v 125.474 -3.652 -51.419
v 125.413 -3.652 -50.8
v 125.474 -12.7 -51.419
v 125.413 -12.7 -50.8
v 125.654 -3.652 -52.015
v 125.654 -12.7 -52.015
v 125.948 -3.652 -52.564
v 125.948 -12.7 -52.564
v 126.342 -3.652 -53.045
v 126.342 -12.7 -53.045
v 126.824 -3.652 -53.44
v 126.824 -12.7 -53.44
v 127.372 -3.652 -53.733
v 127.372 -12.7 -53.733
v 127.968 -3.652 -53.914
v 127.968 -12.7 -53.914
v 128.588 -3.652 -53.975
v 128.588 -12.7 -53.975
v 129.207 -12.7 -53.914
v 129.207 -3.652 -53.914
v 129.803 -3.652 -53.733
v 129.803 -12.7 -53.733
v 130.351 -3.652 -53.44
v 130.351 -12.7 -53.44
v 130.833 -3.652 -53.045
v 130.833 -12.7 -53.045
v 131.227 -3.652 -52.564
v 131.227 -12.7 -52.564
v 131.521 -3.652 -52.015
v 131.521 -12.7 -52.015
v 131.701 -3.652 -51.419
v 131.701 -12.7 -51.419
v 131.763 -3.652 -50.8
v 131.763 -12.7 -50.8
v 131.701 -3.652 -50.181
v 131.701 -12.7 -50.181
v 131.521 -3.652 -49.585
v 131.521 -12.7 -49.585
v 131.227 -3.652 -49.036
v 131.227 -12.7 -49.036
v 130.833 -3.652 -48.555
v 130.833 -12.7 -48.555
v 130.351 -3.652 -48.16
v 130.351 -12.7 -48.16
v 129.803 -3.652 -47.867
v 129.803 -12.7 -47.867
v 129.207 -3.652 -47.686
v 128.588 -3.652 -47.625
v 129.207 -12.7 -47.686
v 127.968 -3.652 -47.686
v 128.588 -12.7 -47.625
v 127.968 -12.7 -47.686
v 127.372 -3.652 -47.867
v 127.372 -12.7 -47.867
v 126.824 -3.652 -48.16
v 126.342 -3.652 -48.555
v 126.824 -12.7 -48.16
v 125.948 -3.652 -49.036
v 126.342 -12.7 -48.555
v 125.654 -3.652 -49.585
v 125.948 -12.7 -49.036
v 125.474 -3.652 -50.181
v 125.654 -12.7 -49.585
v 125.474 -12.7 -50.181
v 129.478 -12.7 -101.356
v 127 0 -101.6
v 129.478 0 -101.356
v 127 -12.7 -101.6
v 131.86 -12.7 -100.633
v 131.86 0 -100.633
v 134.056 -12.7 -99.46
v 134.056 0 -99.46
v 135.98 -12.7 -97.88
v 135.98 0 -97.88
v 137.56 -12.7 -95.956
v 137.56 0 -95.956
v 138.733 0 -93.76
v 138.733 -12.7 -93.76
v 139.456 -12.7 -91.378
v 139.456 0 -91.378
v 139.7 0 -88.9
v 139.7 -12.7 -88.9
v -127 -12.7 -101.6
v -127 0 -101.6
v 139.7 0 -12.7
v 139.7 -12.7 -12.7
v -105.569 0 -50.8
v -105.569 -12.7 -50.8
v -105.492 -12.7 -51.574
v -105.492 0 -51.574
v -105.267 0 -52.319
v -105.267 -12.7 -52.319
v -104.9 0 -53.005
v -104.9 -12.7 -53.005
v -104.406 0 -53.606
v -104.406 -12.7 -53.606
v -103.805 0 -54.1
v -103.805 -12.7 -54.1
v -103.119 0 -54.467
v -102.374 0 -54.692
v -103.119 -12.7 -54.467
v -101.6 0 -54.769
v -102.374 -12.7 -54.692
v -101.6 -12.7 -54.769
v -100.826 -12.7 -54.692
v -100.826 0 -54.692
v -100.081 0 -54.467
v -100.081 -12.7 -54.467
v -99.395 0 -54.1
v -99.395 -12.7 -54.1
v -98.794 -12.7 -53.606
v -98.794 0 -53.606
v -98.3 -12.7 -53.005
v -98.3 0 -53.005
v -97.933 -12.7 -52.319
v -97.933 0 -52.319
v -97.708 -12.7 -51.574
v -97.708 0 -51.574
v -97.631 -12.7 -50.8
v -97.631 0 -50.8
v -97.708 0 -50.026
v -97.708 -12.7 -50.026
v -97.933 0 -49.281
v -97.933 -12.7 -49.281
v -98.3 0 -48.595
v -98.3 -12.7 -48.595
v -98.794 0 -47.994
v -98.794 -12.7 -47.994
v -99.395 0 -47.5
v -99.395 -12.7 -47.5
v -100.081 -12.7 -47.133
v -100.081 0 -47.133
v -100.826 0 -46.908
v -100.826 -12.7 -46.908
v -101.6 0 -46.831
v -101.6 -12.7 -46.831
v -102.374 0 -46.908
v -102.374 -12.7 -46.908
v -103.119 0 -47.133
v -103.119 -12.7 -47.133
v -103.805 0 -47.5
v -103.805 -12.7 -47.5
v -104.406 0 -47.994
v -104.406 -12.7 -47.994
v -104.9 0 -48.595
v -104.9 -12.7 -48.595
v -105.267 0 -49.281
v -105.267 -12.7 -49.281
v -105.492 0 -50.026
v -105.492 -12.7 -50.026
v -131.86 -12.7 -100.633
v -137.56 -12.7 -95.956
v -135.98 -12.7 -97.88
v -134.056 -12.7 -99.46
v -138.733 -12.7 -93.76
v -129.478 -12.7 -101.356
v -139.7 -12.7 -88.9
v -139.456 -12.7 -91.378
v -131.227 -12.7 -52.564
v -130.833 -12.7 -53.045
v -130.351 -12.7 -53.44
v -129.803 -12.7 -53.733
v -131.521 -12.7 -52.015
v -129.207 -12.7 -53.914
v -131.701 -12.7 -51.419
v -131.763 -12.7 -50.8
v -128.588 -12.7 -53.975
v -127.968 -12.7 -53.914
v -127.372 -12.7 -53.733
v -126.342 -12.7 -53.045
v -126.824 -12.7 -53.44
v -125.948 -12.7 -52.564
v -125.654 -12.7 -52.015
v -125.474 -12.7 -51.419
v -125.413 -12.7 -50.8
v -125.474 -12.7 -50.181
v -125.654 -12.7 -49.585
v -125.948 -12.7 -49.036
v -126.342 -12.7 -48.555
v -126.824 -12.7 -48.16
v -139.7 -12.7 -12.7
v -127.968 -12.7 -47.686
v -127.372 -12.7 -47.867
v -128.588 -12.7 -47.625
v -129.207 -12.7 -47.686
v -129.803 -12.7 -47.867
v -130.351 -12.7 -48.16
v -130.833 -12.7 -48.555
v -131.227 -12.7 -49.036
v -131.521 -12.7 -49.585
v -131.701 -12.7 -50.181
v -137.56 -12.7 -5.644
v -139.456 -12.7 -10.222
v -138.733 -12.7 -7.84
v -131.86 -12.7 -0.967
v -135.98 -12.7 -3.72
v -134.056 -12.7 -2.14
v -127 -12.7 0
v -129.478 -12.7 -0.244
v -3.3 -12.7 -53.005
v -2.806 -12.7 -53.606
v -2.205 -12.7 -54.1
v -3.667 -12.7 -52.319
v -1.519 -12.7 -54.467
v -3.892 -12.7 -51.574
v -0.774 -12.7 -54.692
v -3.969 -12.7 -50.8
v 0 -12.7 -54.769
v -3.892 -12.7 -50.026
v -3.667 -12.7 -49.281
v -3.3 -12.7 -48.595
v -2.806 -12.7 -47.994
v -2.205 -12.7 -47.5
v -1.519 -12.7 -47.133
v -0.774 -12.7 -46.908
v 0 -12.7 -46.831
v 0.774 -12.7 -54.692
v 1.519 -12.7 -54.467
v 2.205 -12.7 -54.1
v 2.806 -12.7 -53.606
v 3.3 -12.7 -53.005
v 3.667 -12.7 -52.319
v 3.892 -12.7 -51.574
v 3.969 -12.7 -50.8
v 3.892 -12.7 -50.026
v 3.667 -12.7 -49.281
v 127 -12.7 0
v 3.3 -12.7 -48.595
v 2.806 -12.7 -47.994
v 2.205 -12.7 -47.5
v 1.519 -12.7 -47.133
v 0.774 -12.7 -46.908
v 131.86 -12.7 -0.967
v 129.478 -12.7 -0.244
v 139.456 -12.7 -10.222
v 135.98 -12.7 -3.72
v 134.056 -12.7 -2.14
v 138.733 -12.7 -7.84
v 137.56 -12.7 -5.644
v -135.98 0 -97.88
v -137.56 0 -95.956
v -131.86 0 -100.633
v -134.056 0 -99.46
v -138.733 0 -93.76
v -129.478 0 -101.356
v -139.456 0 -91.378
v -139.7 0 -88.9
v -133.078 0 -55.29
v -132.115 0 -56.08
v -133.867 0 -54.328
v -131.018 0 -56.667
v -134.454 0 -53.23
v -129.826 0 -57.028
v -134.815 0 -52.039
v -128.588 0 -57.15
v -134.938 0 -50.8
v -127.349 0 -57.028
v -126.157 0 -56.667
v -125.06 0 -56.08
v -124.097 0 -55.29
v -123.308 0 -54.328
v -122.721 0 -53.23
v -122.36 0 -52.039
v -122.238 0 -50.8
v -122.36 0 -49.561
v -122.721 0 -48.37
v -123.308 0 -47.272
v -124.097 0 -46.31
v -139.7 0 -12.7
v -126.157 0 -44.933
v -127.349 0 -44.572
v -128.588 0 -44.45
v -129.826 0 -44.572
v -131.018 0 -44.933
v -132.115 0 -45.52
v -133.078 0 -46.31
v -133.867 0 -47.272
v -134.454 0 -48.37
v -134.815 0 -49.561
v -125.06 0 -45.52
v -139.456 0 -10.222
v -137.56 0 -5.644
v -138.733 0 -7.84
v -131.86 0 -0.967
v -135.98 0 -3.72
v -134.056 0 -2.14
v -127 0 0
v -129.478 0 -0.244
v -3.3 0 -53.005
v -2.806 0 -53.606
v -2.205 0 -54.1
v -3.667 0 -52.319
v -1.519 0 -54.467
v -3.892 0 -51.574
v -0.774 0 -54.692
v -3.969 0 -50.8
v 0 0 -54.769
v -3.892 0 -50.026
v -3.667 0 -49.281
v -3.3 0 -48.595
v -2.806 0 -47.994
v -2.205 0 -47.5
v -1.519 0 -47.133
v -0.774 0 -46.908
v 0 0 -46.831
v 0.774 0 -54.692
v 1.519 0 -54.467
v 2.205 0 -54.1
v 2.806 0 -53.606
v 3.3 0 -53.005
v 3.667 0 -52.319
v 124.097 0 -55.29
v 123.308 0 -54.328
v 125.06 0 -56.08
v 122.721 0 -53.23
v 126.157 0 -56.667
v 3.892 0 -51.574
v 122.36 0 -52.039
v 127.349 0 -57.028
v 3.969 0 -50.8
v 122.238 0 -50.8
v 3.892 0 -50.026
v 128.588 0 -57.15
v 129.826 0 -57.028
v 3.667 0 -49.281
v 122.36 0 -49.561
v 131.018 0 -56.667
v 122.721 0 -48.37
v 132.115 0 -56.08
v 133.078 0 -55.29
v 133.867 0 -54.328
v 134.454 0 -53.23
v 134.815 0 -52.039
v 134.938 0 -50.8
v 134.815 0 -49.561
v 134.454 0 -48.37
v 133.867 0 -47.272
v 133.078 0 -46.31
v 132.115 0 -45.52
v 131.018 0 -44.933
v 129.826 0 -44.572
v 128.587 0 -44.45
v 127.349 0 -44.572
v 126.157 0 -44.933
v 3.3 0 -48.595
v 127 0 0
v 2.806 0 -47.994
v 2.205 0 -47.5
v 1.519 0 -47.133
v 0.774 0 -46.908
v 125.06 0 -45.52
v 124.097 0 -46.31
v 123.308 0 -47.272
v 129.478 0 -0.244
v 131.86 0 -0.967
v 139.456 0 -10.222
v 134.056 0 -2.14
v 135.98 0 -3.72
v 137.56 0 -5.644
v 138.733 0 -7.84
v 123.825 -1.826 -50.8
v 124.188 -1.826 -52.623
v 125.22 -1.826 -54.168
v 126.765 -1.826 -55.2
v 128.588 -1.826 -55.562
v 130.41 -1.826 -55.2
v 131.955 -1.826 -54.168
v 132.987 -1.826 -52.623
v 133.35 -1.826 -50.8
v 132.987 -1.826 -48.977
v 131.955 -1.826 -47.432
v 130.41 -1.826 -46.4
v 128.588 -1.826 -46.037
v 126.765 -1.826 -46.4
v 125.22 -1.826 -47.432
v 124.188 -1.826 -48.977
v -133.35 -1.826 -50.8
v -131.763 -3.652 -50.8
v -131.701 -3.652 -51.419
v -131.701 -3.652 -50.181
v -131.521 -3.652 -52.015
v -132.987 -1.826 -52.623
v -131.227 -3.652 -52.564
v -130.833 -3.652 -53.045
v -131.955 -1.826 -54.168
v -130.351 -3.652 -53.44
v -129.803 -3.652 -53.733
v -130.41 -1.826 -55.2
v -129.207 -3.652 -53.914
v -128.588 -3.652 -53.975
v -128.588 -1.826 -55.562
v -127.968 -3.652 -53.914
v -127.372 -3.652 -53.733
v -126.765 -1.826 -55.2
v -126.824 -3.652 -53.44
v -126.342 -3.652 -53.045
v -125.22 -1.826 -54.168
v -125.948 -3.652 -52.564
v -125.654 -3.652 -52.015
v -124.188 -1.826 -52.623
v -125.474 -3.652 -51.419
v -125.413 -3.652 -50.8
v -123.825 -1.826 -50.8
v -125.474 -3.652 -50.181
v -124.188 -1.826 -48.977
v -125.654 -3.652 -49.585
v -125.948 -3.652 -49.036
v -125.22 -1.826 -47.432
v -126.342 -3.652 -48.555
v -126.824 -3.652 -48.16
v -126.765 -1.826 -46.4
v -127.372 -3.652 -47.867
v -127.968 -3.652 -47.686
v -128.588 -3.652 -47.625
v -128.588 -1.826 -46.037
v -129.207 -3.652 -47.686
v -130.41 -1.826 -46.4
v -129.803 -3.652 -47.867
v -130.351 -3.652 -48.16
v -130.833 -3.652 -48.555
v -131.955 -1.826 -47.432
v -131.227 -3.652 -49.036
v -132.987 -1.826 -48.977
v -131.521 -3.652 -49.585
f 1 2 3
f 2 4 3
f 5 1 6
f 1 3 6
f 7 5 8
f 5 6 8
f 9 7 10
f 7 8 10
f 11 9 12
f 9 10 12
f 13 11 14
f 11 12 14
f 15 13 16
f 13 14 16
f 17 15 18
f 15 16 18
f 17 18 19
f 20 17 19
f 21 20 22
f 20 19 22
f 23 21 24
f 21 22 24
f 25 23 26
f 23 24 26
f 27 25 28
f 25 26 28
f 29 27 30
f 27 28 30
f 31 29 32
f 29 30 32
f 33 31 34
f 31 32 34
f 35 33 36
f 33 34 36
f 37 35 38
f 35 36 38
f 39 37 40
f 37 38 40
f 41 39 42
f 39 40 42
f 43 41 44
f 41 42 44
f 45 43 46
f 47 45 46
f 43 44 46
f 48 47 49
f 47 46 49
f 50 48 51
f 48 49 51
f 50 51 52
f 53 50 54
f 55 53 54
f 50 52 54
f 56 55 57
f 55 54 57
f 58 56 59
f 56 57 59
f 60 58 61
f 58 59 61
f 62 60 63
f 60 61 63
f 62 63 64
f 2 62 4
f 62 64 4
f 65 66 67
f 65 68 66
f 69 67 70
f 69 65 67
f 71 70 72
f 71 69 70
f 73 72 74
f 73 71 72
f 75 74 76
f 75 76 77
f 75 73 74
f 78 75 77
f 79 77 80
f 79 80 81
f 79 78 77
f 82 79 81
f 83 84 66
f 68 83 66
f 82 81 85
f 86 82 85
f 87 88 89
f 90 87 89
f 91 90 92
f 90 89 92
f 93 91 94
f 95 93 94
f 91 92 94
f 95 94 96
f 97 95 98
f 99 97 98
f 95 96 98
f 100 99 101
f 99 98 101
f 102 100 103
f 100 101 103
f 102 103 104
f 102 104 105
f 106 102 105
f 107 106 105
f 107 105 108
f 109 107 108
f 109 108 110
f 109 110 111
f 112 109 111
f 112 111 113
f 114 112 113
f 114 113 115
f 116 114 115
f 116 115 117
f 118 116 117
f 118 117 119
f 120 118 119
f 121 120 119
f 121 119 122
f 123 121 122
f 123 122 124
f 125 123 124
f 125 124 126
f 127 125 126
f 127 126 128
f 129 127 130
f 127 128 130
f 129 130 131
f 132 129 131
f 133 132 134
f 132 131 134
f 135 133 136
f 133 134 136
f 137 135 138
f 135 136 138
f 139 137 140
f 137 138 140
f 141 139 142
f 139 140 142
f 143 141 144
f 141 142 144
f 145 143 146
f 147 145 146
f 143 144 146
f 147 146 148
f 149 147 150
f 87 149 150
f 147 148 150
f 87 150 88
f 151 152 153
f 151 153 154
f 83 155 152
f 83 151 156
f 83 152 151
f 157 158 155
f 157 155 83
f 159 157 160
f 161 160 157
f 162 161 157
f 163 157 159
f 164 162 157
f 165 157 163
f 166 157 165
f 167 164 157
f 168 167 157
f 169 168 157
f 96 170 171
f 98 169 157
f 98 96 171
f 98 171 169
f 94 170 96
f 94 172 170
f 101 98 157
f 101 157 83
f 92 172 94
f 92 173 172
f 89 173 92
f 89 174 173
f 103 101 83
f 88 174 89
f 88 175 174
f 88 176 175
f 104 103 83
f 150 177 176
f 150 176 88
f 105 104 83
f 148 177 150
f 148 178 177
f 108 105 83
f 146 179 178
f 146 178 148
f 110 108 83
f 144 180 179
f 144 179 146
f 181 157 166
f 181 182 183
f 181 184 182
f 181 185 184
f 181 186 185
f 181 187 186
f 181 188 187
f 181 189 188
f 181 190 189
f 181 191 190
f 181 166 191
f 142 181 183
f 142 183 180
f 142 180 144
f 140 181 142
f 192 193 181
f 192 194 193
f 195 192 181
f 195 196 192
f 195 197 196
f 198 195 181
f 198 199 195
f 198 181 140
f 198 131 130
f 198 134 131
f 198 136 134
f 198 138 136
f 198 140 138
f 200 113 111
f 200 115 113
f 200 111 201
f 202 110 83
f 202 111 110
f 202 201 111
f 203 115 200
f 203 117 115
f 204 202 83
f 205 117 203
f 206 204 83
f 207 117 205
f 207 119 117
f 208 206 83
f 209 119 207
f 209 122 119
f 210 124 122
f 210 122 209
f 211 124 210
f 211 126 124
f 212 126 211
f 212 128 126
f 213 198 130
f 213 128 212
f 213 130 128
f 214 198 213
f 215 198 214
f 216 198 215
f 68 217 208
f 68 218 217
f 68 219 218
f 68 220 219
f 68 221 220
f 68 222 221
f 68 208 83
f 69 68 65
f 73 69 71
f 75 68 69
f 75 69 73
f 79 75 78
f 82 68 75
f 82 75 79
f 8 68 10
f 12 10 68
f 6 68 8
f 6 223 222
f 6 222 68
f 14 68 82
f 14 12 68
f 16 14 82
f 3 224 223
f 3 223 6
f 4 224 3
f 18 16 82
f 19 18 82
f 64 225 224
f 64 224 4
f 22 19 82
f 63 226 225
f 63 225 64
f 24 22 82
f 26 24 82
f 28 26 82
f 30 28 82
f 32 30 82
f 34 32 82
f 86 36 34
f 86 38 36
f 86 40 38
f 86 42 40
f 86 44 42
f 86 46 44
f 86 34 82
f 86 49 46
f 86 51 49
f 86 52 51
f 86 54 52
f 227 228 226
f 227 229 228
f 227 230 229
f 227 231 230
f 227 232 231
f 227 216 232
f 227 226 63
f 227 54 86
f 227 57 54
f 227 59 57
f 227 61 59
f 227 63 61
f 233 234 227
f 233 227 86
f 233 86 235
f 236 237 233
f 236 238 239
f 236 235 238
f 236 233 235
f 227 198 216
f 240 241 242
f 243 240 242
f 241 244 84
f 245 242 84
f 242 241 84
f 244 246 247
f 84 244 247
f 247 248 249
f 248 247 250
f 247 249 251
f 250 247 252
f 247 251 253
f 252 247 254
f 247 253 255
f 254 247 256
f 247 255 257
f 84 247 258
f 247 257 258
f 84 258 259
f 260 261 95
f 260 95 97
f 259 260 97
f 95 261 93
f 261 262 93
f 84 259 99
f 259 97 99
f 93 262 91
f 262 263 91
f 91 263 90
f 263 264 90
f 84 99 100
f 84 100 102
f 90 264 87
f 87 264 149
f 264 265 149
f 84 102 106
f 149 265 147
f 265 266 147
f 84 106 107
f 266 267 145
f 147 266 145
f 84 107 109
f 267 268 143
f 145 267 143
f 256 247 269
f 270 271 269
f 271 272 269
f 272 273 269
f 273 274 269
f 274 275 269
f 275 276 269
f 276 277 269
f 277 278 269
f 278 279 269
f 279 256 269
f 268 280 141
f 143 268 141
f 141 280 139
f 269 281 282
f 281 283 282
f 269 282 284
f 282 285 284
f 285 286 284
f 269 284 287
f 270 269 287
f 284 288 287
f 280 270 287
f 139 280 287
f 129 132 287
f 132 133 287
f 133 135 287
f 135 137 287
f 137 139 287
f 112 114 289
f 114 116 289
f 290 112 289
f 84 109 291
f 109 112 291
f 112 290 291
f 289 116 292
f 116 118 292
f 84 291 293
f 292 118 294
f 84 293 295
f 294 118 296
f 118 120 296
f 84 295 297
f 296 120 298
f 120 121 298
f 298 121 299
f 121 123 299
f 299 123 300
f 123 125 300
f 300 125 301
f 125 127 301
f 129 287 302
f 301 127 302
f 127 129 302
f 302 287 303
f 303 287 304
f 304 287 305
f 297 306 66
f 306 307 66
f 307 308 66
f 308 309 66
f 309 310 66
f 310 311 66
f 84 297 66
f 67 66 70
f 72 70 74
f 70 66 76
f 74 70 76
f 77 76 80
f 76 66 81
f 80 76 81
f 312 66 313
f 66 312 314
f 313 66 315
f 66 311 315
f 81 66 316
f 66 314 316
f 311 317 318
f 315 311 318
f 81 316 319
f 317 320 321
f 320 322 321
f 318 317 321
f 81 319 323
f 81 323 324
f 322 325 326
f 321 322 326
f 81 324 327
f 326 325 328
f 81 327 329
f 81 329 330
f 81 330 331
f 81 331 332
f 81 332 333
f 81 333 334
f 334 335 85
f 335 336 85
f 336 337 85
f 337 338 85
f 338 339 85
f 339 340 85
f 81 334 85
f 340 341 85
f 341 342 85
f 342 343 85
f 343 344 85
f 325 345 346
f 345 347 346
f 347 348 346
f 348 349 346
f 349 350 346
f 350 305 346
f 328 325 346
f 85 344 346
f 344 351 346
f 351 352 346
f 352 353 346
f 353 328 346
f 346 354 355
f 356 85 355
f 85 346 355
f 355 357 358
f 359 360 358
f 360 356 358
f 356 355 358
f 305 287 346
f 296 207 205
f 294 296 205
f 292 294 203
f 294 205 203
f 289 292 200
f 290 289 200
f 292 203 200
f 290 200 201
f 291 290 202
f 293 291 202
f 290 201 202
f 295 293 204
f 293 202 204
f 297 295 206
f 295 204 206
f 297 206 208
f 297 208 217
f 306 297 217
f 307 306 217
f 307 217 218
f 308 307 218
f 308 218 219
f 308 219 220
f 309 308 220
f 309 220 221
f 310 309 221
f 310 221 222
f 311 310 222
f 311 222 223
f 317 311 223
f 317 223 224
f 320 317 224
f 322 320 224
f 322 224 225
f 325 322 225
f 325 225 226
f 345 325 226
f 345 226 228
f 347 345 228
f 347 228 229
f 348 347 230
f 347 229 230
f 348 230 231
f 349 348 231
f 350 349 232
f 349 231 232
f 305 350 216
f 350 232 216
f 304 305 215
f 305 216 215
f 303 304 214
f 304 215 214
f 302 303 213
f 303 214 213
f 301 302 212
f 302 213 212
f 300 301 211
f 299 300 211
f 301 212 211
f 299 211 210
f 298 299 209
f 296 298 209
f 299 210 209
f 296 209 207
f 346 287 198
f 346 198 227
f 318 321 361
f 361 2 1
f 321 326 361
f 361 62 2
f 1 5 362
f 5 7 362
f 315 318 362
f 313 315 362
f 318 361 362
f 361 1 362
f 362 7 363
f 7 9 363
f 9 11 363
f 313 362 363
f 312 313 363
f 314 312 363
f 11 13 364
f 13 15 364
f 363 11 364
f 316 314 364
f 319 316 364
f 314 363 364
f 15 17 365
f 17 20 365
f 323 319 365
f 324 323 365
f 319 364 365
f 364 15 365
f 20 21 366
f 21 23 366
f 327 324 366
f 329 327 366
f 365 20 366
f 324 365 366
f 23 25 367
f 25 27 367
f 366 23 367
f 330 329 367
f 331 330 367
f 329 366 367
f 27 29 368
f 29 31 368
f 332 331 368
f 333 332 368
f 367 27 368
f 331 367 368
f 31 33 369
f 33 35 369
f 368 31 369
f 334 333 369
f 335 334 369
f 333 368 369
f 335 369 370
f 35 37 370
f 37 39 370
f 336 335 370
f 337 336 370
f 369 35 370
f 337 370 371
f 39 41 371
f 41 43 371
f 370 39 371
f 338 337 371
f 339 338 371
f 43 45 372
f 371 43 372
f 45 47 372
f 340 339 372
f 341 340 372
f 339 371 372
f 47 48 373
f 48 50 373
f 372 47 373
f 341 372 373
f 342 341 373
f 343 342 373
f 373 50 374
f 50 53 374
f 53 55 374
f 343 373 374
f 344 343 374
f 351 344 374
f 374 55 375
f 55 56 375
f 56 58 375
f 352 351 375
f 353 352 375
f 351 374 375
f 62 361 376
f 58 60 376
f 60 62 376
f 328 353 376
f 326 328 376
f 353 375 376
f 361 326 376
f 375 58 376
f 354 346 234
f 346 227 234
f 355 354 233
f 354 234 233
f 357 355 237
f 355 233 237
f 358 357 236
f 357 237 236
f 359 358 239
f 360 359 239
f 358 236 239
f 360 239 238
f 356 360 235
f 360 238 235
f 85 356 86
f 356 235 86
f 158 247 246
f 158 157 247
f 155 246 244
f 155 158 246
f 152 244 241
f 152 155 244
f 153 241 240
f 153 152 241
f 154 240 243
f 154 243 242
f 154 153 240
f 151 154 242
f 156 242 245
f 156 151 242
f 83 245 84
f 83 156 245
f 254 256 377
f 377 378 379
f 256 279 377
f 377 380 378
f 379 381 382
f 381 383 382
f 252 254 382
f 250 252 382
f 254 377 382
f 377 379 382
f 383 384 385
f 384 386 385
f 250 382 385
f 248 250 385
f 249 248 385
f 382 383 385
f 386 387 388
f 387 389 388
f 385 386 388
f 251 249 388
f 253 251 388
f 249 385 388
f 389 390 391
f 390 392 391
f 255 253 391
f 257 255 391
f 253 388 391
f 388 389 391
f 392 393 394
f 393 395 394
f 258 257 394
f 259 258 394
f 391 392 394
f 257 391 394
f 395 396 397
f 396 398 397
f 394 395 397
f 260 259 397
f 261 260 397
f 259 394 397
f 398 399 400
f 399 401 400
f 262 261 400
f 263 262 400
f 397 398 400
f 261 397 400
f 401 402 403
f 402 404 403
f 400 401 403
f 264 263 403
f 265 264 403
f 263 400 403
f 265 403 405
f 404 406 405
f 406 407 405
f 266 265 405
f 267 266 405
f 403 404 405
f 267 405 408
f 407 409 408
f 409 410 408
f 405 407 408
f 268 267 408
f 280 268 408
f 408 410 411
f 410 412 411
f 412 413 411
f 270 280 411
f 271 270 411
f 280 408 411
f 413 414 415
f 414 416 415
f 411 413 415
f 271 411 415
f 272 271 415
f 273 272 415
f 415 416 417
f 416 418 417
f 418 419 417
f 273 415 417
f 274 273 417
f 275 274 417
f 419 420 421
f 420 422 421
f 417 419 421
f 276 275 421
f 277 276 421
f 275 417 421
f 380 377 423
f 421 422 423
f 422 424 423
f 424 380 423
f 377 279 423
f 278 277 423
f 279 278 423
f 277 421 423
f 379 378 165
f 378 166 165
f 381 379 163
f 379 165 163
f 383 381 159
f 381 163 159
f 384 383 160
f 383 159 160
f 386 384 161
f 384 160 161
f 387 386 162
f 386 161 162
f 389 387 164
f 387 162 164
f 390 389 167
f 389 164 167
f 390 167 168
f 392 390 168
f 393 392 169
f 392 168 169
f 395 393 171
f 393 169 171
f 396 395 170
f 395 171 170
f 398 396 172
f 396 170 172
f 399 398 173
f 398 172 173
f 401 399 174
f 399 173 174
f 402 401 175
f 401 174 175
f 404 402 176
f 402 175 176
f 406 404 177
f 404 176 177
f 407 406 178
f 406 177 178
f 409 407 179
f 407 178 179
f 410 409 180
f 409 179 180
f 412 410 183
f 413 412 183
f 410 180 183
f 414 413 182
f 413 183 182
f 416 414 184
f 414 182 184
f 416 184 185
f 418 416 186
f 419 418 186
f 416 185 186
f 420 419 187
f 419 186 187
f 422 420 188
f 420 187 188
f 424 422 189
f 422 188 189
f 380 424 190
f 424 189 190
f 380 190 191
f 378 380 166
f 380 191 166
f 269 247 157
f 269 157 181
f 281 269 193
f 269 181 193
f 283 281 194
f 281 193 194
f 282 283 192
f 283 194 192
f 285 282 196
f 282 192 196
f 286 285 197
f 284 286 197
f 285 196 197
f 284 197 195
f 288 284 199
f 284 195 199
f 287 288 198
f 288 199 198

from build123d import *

# Parameters (mm, degrees)
F0_W           = 279.4
F0_H           = 101.6
F1_DEPTH       = 12.7
F2_D           = 6.35
F2_CSINK_D     = 12.7
F2_CSINK_ANGLE = 82
F3_D           = 7.9375
F4_R           = 12.7


with BuildPart() as f1:
    # F0 (on Front) → F1 (new body)
    with BuildSketch(Plane.XZ):
        with Locations((0, -50.8)):
            Rectangle(F0_W, F0_H)
    extrude(amount=F1_DEPTH)

    # F2 (through all)
    with Locations(Plane(origin=(0, 0, 0), x_dir=(1, 0, 0), z_dir=(0, 1, 0))):
        with Locations((-128.5875, 50.8), (128.5875, 50.8)):
            CounterSinkHole(F2_D / 2, F2_CSINK_D / 2, counter_sink_angle=F2_CSINK_ANGLE)

    # F3 (through all)
    with Locations(Plane(origin=(0, 0, 0), x_dir=(1, 0, 0), z_dir=(0, 1, 0))):
        with Locations((-101.6, 50.8), (0, 50.8)):
            Hole(F3_D / 2)

    # F4
    f4_edges = [f1.edges().sort_by_distance(p)[0] for p in [
        (139.7, -6.35, 0),
        (139.7, -6.35, -101.6),
        (-139.7, -6.35, -101.6),
        (-139.7, -6.35, 0),
    ]]
    fillet(f4_edges, radius=F4_R)


solid = f1.part
